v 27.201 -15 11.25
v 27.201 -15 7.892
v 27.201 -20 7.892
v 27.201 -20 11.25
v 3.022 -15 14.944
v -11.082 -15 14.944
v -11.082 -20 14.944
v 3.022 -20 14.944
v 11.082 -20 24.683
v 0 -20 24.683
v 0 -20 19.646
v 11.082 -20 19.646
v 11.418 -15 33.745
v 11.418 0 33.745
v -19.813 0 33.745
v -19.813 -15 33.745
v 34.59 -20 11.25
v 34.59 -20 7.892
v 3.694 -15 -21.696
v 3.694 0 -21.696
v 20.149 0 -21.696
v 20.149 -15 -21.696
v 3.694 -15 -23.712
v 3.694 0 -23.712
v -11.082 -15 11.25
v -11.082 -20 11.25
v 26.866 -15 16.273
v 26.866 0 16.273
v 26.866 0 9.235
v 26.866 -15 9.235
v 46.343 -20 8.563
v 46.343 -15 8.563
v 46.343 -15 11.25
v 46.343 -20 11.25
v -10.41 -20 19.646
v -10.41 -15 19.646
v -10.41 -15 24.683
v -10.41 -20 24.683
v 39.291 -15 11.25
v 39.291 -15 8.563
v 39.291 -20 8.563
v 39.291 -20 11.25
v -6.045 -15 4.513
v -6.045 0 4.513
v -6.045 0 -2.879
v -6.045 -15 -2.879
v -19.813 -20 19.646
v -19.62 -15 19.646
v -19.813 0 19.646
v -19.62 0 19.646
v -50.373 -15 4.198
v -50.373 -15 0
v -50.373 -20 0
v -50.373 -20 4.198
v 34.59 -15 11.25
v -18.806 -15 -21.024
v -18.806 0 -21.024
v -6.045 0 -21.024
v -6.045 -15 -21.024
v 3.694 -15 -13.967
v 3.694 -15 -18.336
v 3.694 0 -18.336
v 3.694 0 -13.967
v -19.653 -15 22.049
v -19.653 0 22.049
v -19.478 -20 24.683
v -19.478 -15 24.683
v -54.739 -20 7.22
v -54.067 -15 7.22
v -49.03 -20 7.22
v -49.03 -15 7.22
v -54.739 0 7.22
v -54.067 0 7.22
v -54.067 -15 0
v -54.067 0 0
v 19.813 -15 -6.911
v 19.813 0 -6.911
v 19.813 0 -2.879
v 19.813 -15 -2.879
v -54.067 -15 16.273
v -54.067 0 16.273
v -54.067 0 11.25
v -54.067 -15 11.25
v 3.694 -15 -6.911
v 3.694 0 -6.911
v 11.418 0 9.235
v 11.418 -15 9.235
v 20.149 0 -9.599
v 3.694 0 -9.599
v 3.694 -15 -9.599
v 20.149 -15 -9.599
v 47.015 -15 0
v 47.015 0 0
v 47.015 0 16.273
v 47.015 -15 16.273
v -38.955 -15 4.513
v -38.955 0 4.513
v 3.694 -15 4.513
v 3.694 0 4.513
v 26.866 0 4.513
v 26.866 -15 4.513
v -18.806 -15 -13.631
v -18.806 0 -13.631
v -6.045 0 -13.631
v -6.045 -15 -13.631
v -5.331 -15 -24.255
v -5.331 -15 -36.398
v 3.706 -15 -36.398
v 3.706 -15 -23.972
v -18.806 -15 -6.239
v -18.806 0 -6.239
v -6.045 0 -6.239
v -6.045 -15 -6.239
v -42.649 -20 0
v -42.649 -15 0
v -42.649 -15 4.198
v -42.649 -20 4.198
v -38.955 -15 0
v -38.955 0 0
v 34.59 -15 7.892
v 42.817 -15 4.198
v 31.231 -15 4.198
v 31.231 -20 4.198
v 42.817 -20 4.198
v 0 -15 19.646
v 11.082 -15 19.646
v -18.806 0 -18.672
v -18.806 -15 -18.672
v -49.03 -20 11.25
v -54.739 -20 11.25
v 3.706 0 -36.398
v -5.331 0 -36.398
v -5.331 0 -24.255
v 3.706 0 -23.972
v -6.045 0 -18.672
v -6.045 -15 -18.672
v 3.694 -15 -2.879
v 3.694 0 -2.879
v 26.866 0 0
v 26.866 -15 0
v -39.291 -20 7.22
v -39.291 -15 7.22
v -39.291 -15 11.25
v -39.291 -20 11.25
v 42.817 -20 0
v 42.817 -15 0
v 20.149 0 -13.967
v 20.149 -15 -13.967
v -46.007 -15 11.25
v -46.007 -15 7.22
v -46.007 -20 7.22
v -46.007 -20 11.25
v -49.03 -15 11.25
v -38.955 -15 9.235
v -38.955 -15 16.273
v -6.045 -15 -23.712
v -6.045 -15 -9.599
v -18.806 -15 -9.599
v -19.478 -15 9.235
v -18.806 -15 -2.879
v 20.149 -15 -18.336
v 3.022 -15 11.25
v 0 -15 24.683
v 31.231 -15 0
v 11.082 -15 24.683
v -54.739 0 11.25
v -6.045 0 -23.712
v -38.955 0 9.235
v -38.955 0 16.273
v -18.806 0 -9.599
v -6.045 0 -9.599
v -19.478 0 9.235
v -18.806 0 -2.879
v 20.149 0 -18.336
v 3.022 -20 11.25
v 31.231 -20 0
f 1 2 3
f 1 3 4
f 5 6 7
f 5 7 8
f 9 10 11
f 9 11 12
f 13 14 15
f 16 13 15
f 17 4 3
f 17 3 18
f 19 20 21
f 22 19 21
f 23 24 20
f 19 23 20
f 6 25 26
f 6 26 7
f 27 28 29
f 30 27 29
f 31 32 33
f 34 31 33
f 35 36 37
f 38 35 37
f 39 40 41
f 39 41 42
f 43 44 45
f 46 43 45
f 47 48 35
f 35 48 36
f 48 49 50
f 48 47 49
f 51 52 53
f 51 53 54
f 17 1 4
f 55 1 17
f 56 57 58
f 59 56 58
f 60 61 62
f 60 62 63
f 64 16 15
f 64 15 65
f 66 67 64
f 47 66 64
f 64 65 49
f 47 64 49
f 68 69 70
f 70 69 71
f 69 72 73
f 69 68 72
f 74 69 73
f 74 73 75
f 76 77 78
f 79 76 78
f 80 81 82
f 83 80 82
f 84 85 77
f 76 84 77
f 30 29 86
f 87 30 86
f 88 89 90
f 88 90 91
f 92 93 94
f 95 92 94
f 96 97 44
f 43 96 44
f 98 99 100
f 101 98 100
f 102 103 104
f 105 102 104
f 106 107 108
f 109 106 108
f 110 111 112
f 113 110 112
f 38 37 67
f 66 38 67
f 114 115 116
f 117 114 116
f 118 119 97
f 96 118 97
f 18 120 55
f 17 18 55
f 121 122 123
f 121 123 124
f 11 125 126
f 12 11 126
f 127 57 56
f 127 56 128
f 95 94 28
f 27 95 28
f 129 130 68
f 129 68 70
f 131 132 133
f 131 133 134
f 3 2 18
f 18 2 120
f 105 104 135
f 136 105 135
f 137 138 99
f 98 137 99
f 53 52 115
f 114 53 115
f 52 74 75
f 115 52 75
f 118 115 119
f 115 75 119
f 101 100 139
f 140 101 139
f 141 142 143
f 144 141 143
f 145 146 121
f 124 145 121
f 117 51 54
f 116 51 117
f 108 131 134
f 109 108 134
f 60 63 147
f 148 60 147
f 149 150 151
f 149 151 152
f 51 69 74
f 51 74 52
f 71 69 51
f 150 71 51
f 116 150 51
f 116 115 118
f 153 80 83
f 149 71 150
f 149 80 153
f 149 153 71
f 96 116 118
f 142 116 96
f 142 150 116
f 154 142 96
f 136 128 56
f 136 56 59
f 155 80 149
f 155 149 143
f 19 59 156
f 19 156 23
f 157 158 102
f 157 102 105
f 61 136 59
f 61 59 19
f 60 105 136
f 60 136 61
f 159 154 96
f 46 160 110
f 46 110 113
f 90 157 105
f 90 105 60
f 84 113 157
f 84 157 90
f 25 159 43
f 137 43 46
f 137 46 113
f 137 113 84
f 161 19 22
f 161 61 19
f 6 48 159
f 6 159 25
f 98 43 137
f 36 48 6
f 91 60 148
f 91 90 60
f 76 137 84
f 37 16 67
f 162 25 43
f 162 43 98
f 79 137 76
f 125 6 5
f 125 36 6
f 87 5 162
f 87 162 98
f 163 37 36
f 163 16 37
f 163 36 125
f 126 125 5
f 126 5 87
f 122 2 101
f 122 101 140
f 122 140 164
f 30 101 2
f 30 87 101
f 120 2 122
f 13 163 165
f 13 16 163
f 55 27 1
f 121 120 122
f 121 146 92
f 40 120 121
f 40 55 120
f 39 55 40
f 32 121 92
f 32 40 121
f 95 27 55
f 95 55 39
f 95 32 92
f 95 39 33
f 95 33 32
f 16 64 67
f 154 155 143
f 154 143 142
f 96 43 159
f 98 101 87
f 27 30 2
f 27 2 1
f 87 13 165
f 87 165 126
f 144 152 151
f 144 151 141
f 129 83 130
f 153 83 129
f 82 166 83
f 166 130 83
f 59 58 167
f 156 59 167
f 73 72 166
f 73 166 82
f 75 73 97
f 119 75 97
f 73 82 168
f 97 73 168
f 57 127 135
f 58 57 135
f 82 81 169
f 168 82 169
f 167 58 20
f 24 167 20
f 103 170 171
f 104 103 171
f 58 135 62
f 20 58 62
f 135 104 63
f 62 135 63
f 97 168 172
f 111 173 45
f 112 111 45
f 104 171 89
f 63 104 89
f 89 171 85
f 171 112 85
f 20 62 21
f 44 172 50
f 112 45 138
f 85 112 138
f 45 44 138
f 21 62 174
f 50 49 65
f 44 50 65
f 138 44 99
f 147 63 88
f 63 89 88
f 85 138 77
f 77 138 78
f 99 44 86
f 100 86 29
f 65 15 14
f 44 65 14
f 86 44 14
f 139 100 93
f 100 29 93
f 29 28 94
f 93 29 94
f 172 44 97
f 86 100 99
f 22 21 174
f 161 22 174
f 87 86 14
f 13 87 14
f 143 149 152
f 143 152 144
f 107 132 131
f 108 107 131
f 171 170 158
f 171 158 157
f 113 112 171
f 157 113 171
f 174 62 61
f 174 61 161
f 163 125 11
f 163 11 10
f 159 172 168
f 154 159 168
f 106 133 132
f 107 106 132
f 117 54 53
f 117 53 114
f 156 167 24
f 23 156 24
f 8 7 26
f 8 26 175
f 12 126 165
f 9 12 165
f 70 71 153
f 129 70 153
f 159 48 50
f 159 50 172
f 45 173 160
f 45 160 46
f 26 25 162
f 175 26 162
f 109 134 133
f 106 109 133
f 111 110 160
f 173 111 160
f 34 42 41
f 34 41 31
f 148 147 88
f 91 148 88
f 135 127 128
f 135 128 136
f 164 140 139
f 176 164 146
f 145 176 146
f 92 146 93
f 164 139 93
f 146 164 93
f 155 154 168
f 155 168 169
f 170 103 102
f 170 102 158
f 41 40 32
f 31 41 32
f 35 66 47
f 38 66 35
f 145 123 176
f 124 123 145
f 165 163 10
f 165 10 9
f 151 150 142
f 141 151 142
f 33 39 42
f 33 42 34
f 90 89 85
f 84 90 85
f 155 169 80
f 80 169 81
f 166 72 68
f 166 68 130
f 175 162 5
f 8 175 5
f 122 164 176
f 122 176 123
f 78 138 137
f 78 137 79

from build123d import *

# Parameters (mm, degrees)
F0_W     = 12.7611942589
F0_H     = 3.3600605093
F0_W_2   = 16.1194035318
F0_H_2   = 4.0320735425
F0_H_3   = 4.0320726112
F0_W_3   = 16.455223551
F0_H_4   = 4.3680798262
F0_H_5   = 2.3520421237
F0_H_6   = 3.3600591123
F1_DEPTH = 15
F3_DEPTH = 15
F4_W     = 11.0820885748
F4_H     = 5.0373133272
F4_W_2   = 14.1044787597
F4_H_2   = 3.6940285936
F4_W_3   = 7.3880590498
F4_H_3   = 3.3582095057
F4_W_4   = 7.0522390306
F4_H_4   = 2.6865676045
F4_W_5   = 11.5858186036
F4_H_5   = 4.1977614164
F4_W_6   = 6.7164190114
F4_H_6   = 4.0298514068
F4_W_7   = 5.7089552283
F4_W_8   = 7.7238809317
F5_DEPTH = 20


with BuildPart() as f1:
    # F0 (on Front) → F1 (new body)
    with BuildSketch(Plane.XZ):
        Polygon((-19.8134332895, 33.7453708053), (-19.4776132703, 9.2350747436), (-5.5410456844, 9.2350747436), (8.3955219015, 9.2350747436), (11.417908594, 9.2350747436), (11.417908594, 33.7453708053), align=None)
        Polygon((-5.5410456844, 9.2350747436), (-19.4776132703, 9.2350747436), (-38.9552265406, 9.2350747436), (-38.9552265406, 4.5128390193), (-6.0447771102, 4.5128390193), (3.6940297578, 4.5128390193), (26.8656723201, 4.5128390193), (26.8656723201, 9.2350747436), (11.417908594, 9.2350747436), (8.3955219015, 9.2350747436), align=None)
        Polygon((-38.9552265406, 4.5128390193), (-38.9552265406, 9.2350747436), (-38.9552265406, 16.273053363), (-54.0671646595, 16.273053363), (-54.0671646595, 0), (-38.9552265406, 0), align=None)
        Polygon((3.6940297578, 4.5128390193), (-6.0447771102, 4.5128390193), (-6.0447771102, -2.8792954981), (-6.0447771102, -6.2393560074), (-6.0447771102, -9.599417448), (-6.0447771102, -13.6314900592), (-6.0447771102, -18.6715833843), (-6.0447771102, -21.023625508), (-6.0447771102, -23.7116739154), (3.6940297578, -23.7116739154), (3.6940297578, -21.6956362128), (3.6940297578, -18.3355771005), (3.6940297578, -13.9674972743), (3.6940297578, -9.599417448), (3.6940297578, -6.9113690406), (3.6940297578, -2.8792954981), align=None)
        Polygon((26.8656723201, 16.273053363), (26.8656723201, 9.2350747436), (26.8656723201, 4.5128390193), (26.8656723201, 0), (47.0149256289, 0), (47.0149256289, 16.273053363), align=None)
        with Locations((-12.4253742397, -4.5593257528)):
            Rectangle(F0_W, F0_H)
        with Locations((11.7537315236, -4.8953322694)):
            Rectangle(F0_W_2, F0_H_2)
        with Locations((-12.4253742397, -11.6154537536)):
            Rectangle(F0_W, F0_H_3)
        with Locations((11.9216415333, -11.7834573612)):
            Rectangle(F0_W_3, F0_H_4)
        with Locations((-12.4253742397, -19.8476044461)):
            Rectangle(F0_W, F0_H_5)
        with Locations((11.9216415333, -20.0156066567)):
            Rectangle(F0_W_3, F0_H_6)
    extrude(amount=F1_DEPTH)

    # F4 (on Front) → F5 (join)
    with BuildSketch(Plane.XZ):
        Polygon((-10.4104485363, 24.6828366071), (-19.4776132703, 24.6828366071), (-19.8134332895, 19.6455232799), (-10.4104485363, 19.6455232799), align=None)
        with Locations((5.5410442874, 22.1641799435)):
            Rectangle(F4_W, F4_H)
        with Locations((-4.0298519889, 13.0970156752)):
            Rectangle(F4_W_2, F4_H_2)
        with Locations((30.8955218643, 9.5708966255)):
            Rectangle(F4_W_3, F4_H_3)
        with Locations((42.8171660751, 9.9067175761)):
            Rectangle(F4_W_4, F4_H_4)
        with Locations((37.0242567733, 2.0988807082)):
            Rectangle(F4_W_5, F4_H_5)
        with Locations((-42.6492560655, 9.235075675)):
            Rectangle(F4_W_6, F4_H_6)
        with Locations((-51.8843308091, 9.235075675)):
            Rectangle(F4_W_7, F4_H_6)
        with Locations((-46.5111965314, 2.0988807082)):
            Rectangle(F4_W_8, F4_H_5)
    extrude(amount=F5_DEPTH)


with BuildPart() as f3:
    # F2 (on Front) → F3 (new body)
    with BuildSketch(Plane.XZ):
        Polygon((3.705548821, -23.9723213017), (-5.3309509531, -24.2547132075), (-5.3309509531, -36.3975055516), (3.705548821, -36.3975055516), align=None)
    extrude(amount=F3_DEPTH)


solid = Compound([f1.part, f3.part])
